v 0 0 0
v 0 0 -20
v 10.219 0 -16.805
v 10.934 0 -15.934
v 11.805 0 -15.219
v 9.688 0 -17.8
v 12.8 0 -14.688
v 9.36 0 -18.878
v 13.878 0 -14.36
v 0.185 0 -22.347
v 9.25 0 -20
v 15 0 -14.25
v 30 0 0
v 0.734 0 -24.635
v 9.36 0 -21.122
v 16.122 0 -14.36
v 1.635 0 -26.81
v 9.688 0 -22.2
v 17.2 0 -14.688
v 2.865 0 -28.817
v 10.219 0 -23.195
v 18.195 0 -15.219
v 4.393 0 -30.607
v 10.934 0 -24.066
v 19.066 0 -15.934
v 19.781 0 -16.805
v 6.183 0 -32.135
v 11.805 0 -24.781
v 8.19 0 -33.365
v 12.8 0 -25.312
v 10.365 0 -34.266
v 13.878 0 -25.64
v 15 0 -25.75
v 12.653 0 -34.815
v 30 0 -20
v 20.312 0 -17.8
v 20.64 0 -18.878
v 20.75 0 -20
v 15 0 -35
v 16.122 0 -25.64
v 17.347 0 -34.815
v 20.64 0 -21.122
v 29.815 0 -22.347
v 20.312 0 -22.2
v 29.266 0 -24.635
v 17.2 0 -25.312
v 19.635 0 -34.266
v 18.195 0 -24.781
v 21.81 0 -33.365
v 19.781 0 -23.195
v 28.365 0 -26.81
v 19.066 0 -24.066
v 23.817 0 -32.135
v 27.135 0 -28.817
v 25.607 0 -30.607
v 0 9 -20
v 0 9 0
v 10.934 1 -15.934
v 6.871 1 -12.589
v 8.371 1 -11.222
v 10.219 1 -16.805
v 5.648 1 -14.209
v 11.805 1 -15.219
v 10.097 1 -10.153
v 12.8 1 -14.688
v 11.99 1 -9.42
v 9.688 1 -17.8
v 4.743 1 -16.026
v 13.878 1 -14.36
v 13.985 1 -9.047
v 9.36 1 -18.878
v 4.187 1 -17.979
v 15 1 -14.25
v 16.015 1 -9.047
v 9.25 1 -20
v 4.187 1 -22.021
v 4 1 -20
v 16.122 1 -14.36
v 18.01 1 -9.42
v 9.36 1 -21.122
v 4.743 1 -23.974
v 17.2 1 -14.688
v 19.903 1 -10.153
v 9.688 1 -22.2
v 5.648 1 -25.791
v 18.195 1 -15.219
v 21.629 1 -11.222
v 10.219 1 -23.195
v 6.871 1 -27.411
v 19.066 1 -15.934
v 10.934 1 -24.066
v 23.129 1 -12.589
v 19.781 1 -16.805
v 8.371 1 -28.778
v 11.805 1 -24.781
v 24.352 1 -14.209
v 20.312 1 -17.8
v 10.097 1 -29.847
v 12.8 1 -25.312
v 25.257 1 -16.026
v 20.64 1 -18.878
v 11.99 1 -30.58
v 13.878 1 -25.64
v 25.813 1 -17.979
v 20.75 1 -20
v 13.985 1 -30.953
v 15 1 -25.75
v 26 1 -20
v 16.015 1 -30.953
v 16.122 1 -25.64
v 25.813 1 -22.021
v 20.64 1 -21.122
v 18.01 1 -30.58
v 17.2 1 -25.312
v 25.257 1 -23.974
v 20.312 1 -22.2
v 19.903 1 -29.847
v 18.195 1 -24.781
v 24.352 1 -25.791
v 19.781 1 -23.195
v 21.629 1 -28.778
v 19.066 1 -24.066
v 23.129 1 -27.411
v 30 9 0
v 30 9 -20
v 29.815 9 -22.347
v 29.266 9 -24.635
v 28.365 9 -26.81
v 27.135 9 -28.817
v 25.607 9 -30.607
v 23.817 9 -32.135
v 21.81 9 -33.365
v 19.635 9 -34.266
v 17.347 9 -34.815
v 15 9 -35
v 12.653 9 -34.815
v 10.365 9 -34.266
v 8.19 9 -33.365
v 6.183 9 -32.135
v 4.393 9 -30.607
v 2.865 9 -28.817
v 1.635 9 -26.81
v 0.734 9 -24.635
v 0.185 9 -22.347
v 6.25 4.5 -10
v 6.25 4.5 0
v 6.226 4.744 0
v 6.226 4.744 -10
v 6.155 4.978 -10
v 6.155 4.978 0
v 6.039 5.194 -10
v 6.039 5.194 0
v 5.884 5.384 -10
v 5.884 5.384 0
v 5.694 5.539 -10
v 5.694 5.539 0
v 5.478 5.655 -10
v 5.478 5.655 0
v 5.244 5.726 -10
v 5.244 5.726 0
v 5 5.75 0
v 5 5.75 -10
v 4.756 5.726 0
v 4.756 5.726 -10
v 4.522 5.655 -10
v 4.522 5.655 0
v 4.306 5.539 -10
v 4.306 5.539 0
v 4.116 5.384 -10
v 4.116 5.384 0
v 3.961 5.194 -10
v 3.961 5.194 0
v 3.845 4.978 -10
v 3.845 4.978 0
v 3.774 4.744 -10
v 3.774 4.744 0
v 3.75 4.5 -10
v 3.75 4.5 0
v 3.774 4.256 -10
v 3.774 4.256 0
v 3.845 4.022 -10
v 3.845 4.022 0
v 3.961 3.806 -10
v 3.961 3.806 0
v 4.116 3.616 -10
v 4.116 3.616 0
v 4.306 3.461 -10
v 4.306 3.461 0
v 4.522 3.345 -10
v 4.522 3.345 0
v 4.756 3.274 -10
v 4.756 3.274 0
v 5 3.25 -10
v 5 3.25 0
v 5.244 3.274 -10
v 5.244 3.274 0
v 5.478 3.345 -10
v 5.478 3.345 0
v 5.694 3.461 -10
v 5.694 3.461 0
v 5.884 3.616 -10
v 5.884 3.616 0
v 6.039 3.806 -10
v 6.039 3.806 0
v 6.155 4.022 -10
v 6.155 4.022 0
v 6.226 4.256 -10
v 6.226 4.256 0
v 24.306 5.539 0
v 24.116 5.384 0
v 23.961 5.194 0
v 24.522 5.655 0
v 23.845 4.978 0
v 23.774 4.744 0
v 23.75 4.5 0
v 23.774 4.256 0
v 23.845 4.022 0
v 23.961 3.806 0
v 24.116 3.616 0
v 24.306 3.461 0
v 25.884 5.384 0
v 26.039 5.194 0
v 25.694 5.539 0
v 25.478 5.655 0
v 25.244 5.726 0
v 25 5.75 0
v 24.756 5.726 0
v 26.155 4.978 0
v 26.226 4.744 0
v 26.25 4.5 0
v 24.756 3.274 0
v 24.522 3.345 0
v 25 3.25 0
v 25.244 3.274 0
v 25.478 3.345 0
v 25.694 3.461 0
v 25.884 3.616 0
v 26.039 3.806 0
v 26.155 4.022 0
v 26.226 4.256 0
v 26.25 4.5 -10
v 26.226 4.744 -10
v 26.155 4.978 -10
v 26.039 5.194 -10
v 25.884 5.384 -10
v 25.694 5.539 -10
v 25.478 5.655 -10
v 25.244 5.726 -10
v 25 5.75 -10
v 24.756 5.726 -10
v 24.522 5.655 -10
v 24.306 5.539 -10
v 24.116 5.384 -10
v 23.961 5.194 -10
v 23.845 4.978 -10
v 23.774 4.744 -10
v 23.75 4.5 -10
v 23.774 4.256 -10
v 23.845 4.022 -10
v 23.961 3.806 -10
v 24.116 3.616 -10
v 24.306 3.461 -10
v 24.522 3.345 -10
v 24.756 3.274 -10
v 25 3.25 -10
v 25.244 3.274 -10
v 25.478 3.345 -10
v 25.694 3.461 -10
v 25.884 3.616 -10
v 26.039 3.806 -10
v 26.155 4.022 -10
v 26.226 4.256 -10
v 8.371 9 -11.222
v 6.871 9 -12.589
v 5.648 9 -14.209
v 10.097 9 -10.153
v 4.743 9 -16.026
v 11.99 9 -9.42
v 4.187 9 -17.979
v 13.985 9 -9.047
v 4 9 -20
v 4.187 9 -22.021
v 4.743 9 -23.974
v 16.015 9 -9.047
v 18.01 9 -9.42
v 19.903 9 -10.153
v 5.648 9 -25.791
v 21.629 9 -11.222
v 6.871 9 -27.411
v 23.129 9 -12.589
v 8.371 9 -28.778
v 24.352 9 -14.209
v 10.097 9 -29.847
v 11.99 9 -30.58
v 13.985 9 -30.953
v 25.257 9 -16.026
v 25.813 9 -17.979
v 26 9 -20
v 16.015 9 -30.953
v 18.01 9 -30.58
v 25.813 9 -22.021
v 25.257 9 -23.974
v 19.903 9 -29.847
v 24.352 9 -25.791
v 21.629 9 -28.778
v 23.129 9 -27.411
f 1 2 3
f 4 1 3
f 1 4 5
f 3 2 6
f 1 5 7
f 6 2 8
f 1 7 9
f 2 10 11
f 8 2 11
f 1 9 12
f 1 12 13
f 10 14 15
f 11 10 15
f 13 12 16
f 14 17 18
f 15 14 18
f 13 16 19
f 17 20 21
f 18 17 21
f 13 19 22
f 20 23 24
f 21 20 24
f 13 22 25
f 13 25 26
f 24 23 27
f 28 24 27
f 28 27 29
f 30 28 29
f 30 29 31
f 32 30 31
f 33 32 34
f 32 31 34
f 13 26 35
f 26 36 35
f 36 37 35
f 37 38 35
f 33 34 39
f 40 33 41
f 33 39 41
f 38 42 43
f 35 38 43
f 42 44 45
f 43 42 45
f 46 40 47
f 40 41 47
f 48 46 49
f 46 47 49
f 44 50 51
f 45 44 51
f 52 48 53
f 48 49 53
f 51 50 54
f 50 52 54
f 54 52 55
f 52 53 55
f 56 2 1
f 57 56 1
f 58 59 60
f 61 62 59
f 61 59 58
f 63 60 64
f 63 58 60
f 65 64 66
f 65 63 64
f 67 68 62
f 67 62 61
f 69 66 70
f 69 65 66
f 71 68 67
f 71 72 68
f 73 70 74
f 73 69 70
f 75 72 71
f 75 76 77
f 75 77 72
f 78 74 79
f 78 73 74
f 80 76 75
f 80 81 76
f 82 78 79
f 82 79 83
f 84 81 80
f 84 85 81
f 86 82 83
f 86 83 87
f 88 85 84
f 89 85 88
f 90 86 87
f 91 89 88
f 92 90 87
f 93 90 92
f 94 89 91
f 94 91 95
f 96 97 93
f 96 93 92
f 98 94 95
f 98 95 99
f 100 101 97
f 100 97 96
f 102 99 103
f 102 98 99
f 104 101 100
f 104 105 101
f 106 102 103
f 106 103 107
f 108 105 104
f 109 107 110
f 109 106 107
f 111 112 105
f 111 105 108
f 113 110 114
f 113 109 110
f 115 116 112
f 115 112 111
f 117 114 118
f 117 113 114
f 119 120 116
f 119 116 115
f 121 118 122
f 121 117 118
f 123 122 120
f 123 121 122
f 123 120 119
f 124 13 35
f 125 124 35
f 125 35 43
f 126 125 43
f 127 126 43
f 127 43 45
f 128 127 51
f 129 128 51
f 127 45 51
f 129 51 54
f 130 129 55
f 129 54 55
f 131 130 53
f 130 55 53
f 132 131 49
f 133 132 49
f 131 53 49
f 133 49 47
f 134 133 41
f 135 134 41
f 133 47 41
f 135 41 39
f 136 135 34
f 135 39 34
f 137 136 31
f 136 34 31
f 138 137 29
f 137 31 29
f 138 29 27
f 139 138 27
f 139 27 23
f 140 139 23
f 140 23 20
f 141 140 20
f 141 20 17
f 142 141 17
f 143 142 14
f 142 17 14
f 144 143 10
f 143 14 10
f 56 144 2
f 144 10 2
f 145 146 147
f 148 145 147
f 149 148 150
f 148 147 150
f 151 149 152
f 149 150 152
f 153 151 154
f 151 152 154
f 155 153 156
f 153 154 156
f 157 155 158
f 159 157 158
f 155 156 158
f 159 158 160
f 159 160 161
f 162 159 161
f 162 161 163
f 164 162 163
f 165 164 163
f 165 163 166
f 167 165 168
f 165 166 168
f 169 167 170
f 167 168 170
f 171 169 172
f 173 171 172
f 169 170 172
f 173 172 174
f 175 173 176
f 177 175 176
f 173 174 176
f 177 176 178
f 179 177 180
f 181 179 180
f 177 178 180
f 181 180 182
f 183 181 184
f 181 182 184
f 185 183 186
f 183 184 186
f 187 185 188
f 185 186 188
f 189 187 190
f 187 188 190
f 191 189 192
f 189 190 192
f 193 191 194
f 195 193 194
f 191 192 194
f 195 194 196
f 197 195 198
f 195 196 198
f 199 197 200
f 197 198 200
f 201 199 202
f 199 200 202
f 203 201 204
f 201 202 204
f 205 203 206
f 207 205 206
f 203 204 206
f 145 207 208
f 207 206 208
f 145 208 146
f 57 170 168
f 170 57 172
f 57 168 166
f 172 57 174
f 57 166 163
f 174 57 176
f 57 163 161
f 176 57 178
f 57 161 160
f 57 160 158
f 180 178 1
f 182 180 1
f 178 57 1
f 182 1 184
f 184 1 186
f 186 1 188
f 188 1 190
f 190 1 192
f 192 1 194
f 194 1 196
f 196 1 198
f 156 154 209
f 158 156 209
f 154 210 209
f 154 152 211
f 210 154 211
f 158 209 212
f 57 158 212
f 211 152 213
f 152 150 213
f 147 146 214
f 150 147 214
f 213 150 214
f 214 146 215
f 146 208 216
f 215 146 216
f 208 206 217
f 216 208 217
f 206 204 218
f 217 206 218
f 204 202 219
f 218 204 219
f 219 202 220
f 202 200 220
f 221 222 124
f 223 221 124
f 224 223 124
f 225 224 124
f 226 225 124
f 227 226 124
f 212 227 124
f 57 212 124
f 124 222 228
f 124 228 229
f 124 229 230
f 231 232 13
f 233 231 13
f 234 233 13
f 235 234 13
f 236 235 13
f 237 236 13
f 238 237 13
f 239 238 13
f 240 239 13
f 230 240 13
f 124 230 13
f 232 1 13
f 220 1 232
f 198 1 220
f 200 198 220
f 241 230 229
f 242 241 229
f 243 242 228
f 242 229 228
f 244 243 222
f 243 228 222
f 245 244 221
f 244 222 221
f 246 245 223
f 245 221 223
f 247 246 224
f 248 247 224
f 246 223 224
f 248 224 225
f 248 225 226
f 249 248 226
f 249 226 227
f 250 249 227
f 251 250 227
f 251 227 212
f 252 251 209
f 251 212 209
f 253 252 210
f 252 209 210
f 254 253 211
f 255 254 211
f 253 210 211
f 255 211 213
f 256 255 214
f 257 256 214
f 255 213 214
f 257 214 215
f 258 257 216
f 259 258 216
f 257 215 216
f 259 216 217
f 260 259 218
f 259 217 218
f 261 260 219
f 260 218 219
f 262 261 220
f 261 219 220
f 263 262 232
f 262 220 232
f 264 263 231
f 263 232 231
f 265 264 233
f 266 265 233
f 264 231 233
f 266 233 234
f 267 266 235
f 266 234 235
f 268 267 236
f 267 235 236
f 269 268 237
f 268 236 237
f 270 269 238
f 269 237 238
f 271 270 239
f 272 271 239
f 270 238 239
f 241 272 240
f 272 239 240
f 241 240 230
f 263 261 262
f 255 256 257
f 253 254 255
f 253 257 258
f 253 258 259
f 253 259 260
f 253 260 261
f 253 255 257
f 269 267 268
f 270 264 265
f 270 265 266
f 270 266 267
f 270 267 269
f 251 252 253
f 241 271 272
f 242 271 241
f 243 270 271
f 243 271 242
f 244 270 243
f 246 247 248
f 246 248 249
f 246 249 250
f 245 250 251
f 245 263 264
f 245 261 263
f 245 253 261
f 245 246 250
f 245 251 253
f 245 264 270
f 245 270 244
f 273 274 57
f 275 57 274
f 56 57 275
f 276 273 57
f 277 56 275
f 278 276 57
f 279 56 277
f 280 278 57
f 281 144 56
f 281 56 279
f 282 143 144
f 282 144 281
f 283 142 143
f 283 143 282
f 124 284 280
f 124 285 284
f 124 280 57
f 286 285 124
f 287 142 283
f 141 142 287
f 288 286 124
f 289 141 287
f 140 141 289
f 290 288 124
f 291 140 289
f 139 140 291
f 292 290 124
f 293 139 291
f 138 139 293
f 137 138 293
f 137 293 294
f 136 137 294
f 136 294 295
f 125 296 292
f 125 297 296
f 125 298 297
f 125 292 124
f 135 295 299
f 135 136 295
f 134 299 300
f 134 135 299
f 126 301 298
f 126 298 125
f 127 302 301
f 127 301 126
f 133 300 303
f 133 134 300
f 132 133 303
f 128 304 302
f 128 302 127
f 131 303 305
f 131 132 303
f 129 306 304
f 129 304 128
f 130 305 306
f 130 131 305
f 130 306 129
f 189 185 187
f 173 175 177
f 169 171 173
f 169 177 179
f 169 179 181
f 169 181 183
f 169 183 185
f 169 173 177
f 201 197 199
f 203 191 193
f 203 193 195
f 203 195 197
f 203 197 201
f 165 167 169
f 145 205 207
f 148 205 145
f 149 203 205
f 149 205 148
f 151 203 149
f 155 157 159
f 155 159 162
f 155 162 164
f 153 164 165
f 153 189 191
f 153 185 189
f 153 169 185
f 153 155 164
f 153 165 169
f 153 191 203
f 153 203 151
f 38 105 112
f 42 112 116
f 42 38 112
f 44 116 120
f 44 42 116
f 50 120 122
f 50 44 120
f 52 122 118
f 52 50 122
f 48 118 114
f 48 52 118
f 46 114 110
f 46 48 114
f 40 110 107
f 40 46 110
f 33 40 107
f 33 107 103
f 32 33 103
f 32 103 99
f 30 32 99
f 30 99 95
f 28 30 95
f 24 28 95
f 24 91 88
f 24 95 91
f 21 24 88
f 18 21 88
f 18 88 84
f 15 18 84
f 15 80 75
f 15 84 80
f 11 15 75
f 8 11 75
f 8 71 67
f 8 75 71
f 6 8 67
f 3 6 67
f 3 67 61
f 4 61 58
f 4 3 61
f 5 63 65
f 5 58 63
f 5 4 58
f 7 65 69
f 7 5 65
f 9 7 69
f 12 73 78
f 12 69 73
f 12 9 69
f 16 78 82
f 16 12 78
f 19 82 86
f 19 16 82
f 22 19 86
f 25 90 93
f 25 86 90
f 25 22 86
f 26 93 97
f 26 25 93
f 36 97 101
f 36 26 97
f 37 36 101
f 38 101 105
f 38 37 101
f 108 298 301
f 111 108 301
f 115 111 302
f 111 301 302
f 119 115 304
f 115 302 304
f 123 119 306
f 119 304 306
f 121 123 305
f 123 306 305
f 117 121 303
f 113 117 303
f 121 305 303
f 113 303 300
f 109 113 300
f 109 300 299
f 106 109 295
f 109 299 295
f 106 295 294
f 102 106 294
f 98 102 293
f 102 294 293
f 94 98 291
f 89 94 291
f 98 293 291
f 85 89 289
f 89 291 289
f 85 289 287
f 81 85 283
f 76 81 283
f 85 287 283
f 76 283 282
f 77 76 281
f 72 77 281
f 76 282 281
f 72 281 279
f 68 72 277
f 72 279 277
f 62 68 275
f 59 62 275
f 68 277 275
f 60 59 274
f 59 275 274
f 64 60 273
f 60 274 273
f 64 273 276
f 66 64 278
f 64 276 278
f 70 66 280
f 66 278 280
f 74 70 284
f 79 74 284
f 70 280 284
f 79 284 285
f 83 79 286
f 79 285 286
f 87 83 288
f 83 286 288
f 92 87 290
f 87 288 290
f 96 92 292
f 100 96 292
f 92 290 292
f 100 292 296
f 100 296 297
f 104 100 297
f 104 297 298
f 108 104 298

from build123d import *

# Parameters (mm, degrees)
SKETCH1_R           = 11
SKETCH1_R_2         = 5.75
BOSS_EXTRUDE1_DEPTH = 9
SKETCH2_R           = 11
CUT_EXTRUDE1_DEPTH  = 8
SKETCH8_R           = 1.25
CUT_EXTRUDE2_DEPTH  = 10


with BuildPart() as part:
    # Sketch1 → Boss-Extrude1 (new body)
    with BuildSketch(Plane(origin=(0, 0, 0), x_dir=(1, 0, 0), z_dir=(0, 1, 0))):
        with BuildLine():
            Line((30, 0), (30, 20))
            ThreePointArc((30, 20), (15, 35), (0, 20))
            Line((0, 20), (0, 0))
            Line((0, 0), (30, 0))
        make_face()
        with Locations((15, 20)):
            Circle(SKETCH1_R, mode=Mode.SUBTRACT)
        with Locations((15, 20)):
            Circle(SKETCH1_R)
        with Locations((15, 20)):
            Circle(SKETCH1_R_2, mode=Mode.SUBTRACT)
    extrude(amount=BOSS_EXTRUDE1_DEPTH)

    # Sketch2 → Cut-Extrude1 (cut)
    with BuildSketch(Plane(origin=(0, 9, 0), x_dir=(1, 0, 0), z_dir=(0, 1, 0))):
        with Locations((15, 20)):
            Circle(SKETCH2_R)
    extrude(amount=-CUT_EXTRUDE1_DEPTH, mode=Mode.SUBTRACT)

    # Sketch8 → Cut-Extrude2 (cut)
    with BuildSketch(Plane.XY):
        with Locations((25, 4.5)):
            Circle(SKETCH8_R)
        with Locations((5, 4.5)):
            Circle(SKETCH8_R)
    extrude(amount=-CUT_EXTRUDE2_DEPTH, mode=Mode.SUBTRACT)


solid = part.part
